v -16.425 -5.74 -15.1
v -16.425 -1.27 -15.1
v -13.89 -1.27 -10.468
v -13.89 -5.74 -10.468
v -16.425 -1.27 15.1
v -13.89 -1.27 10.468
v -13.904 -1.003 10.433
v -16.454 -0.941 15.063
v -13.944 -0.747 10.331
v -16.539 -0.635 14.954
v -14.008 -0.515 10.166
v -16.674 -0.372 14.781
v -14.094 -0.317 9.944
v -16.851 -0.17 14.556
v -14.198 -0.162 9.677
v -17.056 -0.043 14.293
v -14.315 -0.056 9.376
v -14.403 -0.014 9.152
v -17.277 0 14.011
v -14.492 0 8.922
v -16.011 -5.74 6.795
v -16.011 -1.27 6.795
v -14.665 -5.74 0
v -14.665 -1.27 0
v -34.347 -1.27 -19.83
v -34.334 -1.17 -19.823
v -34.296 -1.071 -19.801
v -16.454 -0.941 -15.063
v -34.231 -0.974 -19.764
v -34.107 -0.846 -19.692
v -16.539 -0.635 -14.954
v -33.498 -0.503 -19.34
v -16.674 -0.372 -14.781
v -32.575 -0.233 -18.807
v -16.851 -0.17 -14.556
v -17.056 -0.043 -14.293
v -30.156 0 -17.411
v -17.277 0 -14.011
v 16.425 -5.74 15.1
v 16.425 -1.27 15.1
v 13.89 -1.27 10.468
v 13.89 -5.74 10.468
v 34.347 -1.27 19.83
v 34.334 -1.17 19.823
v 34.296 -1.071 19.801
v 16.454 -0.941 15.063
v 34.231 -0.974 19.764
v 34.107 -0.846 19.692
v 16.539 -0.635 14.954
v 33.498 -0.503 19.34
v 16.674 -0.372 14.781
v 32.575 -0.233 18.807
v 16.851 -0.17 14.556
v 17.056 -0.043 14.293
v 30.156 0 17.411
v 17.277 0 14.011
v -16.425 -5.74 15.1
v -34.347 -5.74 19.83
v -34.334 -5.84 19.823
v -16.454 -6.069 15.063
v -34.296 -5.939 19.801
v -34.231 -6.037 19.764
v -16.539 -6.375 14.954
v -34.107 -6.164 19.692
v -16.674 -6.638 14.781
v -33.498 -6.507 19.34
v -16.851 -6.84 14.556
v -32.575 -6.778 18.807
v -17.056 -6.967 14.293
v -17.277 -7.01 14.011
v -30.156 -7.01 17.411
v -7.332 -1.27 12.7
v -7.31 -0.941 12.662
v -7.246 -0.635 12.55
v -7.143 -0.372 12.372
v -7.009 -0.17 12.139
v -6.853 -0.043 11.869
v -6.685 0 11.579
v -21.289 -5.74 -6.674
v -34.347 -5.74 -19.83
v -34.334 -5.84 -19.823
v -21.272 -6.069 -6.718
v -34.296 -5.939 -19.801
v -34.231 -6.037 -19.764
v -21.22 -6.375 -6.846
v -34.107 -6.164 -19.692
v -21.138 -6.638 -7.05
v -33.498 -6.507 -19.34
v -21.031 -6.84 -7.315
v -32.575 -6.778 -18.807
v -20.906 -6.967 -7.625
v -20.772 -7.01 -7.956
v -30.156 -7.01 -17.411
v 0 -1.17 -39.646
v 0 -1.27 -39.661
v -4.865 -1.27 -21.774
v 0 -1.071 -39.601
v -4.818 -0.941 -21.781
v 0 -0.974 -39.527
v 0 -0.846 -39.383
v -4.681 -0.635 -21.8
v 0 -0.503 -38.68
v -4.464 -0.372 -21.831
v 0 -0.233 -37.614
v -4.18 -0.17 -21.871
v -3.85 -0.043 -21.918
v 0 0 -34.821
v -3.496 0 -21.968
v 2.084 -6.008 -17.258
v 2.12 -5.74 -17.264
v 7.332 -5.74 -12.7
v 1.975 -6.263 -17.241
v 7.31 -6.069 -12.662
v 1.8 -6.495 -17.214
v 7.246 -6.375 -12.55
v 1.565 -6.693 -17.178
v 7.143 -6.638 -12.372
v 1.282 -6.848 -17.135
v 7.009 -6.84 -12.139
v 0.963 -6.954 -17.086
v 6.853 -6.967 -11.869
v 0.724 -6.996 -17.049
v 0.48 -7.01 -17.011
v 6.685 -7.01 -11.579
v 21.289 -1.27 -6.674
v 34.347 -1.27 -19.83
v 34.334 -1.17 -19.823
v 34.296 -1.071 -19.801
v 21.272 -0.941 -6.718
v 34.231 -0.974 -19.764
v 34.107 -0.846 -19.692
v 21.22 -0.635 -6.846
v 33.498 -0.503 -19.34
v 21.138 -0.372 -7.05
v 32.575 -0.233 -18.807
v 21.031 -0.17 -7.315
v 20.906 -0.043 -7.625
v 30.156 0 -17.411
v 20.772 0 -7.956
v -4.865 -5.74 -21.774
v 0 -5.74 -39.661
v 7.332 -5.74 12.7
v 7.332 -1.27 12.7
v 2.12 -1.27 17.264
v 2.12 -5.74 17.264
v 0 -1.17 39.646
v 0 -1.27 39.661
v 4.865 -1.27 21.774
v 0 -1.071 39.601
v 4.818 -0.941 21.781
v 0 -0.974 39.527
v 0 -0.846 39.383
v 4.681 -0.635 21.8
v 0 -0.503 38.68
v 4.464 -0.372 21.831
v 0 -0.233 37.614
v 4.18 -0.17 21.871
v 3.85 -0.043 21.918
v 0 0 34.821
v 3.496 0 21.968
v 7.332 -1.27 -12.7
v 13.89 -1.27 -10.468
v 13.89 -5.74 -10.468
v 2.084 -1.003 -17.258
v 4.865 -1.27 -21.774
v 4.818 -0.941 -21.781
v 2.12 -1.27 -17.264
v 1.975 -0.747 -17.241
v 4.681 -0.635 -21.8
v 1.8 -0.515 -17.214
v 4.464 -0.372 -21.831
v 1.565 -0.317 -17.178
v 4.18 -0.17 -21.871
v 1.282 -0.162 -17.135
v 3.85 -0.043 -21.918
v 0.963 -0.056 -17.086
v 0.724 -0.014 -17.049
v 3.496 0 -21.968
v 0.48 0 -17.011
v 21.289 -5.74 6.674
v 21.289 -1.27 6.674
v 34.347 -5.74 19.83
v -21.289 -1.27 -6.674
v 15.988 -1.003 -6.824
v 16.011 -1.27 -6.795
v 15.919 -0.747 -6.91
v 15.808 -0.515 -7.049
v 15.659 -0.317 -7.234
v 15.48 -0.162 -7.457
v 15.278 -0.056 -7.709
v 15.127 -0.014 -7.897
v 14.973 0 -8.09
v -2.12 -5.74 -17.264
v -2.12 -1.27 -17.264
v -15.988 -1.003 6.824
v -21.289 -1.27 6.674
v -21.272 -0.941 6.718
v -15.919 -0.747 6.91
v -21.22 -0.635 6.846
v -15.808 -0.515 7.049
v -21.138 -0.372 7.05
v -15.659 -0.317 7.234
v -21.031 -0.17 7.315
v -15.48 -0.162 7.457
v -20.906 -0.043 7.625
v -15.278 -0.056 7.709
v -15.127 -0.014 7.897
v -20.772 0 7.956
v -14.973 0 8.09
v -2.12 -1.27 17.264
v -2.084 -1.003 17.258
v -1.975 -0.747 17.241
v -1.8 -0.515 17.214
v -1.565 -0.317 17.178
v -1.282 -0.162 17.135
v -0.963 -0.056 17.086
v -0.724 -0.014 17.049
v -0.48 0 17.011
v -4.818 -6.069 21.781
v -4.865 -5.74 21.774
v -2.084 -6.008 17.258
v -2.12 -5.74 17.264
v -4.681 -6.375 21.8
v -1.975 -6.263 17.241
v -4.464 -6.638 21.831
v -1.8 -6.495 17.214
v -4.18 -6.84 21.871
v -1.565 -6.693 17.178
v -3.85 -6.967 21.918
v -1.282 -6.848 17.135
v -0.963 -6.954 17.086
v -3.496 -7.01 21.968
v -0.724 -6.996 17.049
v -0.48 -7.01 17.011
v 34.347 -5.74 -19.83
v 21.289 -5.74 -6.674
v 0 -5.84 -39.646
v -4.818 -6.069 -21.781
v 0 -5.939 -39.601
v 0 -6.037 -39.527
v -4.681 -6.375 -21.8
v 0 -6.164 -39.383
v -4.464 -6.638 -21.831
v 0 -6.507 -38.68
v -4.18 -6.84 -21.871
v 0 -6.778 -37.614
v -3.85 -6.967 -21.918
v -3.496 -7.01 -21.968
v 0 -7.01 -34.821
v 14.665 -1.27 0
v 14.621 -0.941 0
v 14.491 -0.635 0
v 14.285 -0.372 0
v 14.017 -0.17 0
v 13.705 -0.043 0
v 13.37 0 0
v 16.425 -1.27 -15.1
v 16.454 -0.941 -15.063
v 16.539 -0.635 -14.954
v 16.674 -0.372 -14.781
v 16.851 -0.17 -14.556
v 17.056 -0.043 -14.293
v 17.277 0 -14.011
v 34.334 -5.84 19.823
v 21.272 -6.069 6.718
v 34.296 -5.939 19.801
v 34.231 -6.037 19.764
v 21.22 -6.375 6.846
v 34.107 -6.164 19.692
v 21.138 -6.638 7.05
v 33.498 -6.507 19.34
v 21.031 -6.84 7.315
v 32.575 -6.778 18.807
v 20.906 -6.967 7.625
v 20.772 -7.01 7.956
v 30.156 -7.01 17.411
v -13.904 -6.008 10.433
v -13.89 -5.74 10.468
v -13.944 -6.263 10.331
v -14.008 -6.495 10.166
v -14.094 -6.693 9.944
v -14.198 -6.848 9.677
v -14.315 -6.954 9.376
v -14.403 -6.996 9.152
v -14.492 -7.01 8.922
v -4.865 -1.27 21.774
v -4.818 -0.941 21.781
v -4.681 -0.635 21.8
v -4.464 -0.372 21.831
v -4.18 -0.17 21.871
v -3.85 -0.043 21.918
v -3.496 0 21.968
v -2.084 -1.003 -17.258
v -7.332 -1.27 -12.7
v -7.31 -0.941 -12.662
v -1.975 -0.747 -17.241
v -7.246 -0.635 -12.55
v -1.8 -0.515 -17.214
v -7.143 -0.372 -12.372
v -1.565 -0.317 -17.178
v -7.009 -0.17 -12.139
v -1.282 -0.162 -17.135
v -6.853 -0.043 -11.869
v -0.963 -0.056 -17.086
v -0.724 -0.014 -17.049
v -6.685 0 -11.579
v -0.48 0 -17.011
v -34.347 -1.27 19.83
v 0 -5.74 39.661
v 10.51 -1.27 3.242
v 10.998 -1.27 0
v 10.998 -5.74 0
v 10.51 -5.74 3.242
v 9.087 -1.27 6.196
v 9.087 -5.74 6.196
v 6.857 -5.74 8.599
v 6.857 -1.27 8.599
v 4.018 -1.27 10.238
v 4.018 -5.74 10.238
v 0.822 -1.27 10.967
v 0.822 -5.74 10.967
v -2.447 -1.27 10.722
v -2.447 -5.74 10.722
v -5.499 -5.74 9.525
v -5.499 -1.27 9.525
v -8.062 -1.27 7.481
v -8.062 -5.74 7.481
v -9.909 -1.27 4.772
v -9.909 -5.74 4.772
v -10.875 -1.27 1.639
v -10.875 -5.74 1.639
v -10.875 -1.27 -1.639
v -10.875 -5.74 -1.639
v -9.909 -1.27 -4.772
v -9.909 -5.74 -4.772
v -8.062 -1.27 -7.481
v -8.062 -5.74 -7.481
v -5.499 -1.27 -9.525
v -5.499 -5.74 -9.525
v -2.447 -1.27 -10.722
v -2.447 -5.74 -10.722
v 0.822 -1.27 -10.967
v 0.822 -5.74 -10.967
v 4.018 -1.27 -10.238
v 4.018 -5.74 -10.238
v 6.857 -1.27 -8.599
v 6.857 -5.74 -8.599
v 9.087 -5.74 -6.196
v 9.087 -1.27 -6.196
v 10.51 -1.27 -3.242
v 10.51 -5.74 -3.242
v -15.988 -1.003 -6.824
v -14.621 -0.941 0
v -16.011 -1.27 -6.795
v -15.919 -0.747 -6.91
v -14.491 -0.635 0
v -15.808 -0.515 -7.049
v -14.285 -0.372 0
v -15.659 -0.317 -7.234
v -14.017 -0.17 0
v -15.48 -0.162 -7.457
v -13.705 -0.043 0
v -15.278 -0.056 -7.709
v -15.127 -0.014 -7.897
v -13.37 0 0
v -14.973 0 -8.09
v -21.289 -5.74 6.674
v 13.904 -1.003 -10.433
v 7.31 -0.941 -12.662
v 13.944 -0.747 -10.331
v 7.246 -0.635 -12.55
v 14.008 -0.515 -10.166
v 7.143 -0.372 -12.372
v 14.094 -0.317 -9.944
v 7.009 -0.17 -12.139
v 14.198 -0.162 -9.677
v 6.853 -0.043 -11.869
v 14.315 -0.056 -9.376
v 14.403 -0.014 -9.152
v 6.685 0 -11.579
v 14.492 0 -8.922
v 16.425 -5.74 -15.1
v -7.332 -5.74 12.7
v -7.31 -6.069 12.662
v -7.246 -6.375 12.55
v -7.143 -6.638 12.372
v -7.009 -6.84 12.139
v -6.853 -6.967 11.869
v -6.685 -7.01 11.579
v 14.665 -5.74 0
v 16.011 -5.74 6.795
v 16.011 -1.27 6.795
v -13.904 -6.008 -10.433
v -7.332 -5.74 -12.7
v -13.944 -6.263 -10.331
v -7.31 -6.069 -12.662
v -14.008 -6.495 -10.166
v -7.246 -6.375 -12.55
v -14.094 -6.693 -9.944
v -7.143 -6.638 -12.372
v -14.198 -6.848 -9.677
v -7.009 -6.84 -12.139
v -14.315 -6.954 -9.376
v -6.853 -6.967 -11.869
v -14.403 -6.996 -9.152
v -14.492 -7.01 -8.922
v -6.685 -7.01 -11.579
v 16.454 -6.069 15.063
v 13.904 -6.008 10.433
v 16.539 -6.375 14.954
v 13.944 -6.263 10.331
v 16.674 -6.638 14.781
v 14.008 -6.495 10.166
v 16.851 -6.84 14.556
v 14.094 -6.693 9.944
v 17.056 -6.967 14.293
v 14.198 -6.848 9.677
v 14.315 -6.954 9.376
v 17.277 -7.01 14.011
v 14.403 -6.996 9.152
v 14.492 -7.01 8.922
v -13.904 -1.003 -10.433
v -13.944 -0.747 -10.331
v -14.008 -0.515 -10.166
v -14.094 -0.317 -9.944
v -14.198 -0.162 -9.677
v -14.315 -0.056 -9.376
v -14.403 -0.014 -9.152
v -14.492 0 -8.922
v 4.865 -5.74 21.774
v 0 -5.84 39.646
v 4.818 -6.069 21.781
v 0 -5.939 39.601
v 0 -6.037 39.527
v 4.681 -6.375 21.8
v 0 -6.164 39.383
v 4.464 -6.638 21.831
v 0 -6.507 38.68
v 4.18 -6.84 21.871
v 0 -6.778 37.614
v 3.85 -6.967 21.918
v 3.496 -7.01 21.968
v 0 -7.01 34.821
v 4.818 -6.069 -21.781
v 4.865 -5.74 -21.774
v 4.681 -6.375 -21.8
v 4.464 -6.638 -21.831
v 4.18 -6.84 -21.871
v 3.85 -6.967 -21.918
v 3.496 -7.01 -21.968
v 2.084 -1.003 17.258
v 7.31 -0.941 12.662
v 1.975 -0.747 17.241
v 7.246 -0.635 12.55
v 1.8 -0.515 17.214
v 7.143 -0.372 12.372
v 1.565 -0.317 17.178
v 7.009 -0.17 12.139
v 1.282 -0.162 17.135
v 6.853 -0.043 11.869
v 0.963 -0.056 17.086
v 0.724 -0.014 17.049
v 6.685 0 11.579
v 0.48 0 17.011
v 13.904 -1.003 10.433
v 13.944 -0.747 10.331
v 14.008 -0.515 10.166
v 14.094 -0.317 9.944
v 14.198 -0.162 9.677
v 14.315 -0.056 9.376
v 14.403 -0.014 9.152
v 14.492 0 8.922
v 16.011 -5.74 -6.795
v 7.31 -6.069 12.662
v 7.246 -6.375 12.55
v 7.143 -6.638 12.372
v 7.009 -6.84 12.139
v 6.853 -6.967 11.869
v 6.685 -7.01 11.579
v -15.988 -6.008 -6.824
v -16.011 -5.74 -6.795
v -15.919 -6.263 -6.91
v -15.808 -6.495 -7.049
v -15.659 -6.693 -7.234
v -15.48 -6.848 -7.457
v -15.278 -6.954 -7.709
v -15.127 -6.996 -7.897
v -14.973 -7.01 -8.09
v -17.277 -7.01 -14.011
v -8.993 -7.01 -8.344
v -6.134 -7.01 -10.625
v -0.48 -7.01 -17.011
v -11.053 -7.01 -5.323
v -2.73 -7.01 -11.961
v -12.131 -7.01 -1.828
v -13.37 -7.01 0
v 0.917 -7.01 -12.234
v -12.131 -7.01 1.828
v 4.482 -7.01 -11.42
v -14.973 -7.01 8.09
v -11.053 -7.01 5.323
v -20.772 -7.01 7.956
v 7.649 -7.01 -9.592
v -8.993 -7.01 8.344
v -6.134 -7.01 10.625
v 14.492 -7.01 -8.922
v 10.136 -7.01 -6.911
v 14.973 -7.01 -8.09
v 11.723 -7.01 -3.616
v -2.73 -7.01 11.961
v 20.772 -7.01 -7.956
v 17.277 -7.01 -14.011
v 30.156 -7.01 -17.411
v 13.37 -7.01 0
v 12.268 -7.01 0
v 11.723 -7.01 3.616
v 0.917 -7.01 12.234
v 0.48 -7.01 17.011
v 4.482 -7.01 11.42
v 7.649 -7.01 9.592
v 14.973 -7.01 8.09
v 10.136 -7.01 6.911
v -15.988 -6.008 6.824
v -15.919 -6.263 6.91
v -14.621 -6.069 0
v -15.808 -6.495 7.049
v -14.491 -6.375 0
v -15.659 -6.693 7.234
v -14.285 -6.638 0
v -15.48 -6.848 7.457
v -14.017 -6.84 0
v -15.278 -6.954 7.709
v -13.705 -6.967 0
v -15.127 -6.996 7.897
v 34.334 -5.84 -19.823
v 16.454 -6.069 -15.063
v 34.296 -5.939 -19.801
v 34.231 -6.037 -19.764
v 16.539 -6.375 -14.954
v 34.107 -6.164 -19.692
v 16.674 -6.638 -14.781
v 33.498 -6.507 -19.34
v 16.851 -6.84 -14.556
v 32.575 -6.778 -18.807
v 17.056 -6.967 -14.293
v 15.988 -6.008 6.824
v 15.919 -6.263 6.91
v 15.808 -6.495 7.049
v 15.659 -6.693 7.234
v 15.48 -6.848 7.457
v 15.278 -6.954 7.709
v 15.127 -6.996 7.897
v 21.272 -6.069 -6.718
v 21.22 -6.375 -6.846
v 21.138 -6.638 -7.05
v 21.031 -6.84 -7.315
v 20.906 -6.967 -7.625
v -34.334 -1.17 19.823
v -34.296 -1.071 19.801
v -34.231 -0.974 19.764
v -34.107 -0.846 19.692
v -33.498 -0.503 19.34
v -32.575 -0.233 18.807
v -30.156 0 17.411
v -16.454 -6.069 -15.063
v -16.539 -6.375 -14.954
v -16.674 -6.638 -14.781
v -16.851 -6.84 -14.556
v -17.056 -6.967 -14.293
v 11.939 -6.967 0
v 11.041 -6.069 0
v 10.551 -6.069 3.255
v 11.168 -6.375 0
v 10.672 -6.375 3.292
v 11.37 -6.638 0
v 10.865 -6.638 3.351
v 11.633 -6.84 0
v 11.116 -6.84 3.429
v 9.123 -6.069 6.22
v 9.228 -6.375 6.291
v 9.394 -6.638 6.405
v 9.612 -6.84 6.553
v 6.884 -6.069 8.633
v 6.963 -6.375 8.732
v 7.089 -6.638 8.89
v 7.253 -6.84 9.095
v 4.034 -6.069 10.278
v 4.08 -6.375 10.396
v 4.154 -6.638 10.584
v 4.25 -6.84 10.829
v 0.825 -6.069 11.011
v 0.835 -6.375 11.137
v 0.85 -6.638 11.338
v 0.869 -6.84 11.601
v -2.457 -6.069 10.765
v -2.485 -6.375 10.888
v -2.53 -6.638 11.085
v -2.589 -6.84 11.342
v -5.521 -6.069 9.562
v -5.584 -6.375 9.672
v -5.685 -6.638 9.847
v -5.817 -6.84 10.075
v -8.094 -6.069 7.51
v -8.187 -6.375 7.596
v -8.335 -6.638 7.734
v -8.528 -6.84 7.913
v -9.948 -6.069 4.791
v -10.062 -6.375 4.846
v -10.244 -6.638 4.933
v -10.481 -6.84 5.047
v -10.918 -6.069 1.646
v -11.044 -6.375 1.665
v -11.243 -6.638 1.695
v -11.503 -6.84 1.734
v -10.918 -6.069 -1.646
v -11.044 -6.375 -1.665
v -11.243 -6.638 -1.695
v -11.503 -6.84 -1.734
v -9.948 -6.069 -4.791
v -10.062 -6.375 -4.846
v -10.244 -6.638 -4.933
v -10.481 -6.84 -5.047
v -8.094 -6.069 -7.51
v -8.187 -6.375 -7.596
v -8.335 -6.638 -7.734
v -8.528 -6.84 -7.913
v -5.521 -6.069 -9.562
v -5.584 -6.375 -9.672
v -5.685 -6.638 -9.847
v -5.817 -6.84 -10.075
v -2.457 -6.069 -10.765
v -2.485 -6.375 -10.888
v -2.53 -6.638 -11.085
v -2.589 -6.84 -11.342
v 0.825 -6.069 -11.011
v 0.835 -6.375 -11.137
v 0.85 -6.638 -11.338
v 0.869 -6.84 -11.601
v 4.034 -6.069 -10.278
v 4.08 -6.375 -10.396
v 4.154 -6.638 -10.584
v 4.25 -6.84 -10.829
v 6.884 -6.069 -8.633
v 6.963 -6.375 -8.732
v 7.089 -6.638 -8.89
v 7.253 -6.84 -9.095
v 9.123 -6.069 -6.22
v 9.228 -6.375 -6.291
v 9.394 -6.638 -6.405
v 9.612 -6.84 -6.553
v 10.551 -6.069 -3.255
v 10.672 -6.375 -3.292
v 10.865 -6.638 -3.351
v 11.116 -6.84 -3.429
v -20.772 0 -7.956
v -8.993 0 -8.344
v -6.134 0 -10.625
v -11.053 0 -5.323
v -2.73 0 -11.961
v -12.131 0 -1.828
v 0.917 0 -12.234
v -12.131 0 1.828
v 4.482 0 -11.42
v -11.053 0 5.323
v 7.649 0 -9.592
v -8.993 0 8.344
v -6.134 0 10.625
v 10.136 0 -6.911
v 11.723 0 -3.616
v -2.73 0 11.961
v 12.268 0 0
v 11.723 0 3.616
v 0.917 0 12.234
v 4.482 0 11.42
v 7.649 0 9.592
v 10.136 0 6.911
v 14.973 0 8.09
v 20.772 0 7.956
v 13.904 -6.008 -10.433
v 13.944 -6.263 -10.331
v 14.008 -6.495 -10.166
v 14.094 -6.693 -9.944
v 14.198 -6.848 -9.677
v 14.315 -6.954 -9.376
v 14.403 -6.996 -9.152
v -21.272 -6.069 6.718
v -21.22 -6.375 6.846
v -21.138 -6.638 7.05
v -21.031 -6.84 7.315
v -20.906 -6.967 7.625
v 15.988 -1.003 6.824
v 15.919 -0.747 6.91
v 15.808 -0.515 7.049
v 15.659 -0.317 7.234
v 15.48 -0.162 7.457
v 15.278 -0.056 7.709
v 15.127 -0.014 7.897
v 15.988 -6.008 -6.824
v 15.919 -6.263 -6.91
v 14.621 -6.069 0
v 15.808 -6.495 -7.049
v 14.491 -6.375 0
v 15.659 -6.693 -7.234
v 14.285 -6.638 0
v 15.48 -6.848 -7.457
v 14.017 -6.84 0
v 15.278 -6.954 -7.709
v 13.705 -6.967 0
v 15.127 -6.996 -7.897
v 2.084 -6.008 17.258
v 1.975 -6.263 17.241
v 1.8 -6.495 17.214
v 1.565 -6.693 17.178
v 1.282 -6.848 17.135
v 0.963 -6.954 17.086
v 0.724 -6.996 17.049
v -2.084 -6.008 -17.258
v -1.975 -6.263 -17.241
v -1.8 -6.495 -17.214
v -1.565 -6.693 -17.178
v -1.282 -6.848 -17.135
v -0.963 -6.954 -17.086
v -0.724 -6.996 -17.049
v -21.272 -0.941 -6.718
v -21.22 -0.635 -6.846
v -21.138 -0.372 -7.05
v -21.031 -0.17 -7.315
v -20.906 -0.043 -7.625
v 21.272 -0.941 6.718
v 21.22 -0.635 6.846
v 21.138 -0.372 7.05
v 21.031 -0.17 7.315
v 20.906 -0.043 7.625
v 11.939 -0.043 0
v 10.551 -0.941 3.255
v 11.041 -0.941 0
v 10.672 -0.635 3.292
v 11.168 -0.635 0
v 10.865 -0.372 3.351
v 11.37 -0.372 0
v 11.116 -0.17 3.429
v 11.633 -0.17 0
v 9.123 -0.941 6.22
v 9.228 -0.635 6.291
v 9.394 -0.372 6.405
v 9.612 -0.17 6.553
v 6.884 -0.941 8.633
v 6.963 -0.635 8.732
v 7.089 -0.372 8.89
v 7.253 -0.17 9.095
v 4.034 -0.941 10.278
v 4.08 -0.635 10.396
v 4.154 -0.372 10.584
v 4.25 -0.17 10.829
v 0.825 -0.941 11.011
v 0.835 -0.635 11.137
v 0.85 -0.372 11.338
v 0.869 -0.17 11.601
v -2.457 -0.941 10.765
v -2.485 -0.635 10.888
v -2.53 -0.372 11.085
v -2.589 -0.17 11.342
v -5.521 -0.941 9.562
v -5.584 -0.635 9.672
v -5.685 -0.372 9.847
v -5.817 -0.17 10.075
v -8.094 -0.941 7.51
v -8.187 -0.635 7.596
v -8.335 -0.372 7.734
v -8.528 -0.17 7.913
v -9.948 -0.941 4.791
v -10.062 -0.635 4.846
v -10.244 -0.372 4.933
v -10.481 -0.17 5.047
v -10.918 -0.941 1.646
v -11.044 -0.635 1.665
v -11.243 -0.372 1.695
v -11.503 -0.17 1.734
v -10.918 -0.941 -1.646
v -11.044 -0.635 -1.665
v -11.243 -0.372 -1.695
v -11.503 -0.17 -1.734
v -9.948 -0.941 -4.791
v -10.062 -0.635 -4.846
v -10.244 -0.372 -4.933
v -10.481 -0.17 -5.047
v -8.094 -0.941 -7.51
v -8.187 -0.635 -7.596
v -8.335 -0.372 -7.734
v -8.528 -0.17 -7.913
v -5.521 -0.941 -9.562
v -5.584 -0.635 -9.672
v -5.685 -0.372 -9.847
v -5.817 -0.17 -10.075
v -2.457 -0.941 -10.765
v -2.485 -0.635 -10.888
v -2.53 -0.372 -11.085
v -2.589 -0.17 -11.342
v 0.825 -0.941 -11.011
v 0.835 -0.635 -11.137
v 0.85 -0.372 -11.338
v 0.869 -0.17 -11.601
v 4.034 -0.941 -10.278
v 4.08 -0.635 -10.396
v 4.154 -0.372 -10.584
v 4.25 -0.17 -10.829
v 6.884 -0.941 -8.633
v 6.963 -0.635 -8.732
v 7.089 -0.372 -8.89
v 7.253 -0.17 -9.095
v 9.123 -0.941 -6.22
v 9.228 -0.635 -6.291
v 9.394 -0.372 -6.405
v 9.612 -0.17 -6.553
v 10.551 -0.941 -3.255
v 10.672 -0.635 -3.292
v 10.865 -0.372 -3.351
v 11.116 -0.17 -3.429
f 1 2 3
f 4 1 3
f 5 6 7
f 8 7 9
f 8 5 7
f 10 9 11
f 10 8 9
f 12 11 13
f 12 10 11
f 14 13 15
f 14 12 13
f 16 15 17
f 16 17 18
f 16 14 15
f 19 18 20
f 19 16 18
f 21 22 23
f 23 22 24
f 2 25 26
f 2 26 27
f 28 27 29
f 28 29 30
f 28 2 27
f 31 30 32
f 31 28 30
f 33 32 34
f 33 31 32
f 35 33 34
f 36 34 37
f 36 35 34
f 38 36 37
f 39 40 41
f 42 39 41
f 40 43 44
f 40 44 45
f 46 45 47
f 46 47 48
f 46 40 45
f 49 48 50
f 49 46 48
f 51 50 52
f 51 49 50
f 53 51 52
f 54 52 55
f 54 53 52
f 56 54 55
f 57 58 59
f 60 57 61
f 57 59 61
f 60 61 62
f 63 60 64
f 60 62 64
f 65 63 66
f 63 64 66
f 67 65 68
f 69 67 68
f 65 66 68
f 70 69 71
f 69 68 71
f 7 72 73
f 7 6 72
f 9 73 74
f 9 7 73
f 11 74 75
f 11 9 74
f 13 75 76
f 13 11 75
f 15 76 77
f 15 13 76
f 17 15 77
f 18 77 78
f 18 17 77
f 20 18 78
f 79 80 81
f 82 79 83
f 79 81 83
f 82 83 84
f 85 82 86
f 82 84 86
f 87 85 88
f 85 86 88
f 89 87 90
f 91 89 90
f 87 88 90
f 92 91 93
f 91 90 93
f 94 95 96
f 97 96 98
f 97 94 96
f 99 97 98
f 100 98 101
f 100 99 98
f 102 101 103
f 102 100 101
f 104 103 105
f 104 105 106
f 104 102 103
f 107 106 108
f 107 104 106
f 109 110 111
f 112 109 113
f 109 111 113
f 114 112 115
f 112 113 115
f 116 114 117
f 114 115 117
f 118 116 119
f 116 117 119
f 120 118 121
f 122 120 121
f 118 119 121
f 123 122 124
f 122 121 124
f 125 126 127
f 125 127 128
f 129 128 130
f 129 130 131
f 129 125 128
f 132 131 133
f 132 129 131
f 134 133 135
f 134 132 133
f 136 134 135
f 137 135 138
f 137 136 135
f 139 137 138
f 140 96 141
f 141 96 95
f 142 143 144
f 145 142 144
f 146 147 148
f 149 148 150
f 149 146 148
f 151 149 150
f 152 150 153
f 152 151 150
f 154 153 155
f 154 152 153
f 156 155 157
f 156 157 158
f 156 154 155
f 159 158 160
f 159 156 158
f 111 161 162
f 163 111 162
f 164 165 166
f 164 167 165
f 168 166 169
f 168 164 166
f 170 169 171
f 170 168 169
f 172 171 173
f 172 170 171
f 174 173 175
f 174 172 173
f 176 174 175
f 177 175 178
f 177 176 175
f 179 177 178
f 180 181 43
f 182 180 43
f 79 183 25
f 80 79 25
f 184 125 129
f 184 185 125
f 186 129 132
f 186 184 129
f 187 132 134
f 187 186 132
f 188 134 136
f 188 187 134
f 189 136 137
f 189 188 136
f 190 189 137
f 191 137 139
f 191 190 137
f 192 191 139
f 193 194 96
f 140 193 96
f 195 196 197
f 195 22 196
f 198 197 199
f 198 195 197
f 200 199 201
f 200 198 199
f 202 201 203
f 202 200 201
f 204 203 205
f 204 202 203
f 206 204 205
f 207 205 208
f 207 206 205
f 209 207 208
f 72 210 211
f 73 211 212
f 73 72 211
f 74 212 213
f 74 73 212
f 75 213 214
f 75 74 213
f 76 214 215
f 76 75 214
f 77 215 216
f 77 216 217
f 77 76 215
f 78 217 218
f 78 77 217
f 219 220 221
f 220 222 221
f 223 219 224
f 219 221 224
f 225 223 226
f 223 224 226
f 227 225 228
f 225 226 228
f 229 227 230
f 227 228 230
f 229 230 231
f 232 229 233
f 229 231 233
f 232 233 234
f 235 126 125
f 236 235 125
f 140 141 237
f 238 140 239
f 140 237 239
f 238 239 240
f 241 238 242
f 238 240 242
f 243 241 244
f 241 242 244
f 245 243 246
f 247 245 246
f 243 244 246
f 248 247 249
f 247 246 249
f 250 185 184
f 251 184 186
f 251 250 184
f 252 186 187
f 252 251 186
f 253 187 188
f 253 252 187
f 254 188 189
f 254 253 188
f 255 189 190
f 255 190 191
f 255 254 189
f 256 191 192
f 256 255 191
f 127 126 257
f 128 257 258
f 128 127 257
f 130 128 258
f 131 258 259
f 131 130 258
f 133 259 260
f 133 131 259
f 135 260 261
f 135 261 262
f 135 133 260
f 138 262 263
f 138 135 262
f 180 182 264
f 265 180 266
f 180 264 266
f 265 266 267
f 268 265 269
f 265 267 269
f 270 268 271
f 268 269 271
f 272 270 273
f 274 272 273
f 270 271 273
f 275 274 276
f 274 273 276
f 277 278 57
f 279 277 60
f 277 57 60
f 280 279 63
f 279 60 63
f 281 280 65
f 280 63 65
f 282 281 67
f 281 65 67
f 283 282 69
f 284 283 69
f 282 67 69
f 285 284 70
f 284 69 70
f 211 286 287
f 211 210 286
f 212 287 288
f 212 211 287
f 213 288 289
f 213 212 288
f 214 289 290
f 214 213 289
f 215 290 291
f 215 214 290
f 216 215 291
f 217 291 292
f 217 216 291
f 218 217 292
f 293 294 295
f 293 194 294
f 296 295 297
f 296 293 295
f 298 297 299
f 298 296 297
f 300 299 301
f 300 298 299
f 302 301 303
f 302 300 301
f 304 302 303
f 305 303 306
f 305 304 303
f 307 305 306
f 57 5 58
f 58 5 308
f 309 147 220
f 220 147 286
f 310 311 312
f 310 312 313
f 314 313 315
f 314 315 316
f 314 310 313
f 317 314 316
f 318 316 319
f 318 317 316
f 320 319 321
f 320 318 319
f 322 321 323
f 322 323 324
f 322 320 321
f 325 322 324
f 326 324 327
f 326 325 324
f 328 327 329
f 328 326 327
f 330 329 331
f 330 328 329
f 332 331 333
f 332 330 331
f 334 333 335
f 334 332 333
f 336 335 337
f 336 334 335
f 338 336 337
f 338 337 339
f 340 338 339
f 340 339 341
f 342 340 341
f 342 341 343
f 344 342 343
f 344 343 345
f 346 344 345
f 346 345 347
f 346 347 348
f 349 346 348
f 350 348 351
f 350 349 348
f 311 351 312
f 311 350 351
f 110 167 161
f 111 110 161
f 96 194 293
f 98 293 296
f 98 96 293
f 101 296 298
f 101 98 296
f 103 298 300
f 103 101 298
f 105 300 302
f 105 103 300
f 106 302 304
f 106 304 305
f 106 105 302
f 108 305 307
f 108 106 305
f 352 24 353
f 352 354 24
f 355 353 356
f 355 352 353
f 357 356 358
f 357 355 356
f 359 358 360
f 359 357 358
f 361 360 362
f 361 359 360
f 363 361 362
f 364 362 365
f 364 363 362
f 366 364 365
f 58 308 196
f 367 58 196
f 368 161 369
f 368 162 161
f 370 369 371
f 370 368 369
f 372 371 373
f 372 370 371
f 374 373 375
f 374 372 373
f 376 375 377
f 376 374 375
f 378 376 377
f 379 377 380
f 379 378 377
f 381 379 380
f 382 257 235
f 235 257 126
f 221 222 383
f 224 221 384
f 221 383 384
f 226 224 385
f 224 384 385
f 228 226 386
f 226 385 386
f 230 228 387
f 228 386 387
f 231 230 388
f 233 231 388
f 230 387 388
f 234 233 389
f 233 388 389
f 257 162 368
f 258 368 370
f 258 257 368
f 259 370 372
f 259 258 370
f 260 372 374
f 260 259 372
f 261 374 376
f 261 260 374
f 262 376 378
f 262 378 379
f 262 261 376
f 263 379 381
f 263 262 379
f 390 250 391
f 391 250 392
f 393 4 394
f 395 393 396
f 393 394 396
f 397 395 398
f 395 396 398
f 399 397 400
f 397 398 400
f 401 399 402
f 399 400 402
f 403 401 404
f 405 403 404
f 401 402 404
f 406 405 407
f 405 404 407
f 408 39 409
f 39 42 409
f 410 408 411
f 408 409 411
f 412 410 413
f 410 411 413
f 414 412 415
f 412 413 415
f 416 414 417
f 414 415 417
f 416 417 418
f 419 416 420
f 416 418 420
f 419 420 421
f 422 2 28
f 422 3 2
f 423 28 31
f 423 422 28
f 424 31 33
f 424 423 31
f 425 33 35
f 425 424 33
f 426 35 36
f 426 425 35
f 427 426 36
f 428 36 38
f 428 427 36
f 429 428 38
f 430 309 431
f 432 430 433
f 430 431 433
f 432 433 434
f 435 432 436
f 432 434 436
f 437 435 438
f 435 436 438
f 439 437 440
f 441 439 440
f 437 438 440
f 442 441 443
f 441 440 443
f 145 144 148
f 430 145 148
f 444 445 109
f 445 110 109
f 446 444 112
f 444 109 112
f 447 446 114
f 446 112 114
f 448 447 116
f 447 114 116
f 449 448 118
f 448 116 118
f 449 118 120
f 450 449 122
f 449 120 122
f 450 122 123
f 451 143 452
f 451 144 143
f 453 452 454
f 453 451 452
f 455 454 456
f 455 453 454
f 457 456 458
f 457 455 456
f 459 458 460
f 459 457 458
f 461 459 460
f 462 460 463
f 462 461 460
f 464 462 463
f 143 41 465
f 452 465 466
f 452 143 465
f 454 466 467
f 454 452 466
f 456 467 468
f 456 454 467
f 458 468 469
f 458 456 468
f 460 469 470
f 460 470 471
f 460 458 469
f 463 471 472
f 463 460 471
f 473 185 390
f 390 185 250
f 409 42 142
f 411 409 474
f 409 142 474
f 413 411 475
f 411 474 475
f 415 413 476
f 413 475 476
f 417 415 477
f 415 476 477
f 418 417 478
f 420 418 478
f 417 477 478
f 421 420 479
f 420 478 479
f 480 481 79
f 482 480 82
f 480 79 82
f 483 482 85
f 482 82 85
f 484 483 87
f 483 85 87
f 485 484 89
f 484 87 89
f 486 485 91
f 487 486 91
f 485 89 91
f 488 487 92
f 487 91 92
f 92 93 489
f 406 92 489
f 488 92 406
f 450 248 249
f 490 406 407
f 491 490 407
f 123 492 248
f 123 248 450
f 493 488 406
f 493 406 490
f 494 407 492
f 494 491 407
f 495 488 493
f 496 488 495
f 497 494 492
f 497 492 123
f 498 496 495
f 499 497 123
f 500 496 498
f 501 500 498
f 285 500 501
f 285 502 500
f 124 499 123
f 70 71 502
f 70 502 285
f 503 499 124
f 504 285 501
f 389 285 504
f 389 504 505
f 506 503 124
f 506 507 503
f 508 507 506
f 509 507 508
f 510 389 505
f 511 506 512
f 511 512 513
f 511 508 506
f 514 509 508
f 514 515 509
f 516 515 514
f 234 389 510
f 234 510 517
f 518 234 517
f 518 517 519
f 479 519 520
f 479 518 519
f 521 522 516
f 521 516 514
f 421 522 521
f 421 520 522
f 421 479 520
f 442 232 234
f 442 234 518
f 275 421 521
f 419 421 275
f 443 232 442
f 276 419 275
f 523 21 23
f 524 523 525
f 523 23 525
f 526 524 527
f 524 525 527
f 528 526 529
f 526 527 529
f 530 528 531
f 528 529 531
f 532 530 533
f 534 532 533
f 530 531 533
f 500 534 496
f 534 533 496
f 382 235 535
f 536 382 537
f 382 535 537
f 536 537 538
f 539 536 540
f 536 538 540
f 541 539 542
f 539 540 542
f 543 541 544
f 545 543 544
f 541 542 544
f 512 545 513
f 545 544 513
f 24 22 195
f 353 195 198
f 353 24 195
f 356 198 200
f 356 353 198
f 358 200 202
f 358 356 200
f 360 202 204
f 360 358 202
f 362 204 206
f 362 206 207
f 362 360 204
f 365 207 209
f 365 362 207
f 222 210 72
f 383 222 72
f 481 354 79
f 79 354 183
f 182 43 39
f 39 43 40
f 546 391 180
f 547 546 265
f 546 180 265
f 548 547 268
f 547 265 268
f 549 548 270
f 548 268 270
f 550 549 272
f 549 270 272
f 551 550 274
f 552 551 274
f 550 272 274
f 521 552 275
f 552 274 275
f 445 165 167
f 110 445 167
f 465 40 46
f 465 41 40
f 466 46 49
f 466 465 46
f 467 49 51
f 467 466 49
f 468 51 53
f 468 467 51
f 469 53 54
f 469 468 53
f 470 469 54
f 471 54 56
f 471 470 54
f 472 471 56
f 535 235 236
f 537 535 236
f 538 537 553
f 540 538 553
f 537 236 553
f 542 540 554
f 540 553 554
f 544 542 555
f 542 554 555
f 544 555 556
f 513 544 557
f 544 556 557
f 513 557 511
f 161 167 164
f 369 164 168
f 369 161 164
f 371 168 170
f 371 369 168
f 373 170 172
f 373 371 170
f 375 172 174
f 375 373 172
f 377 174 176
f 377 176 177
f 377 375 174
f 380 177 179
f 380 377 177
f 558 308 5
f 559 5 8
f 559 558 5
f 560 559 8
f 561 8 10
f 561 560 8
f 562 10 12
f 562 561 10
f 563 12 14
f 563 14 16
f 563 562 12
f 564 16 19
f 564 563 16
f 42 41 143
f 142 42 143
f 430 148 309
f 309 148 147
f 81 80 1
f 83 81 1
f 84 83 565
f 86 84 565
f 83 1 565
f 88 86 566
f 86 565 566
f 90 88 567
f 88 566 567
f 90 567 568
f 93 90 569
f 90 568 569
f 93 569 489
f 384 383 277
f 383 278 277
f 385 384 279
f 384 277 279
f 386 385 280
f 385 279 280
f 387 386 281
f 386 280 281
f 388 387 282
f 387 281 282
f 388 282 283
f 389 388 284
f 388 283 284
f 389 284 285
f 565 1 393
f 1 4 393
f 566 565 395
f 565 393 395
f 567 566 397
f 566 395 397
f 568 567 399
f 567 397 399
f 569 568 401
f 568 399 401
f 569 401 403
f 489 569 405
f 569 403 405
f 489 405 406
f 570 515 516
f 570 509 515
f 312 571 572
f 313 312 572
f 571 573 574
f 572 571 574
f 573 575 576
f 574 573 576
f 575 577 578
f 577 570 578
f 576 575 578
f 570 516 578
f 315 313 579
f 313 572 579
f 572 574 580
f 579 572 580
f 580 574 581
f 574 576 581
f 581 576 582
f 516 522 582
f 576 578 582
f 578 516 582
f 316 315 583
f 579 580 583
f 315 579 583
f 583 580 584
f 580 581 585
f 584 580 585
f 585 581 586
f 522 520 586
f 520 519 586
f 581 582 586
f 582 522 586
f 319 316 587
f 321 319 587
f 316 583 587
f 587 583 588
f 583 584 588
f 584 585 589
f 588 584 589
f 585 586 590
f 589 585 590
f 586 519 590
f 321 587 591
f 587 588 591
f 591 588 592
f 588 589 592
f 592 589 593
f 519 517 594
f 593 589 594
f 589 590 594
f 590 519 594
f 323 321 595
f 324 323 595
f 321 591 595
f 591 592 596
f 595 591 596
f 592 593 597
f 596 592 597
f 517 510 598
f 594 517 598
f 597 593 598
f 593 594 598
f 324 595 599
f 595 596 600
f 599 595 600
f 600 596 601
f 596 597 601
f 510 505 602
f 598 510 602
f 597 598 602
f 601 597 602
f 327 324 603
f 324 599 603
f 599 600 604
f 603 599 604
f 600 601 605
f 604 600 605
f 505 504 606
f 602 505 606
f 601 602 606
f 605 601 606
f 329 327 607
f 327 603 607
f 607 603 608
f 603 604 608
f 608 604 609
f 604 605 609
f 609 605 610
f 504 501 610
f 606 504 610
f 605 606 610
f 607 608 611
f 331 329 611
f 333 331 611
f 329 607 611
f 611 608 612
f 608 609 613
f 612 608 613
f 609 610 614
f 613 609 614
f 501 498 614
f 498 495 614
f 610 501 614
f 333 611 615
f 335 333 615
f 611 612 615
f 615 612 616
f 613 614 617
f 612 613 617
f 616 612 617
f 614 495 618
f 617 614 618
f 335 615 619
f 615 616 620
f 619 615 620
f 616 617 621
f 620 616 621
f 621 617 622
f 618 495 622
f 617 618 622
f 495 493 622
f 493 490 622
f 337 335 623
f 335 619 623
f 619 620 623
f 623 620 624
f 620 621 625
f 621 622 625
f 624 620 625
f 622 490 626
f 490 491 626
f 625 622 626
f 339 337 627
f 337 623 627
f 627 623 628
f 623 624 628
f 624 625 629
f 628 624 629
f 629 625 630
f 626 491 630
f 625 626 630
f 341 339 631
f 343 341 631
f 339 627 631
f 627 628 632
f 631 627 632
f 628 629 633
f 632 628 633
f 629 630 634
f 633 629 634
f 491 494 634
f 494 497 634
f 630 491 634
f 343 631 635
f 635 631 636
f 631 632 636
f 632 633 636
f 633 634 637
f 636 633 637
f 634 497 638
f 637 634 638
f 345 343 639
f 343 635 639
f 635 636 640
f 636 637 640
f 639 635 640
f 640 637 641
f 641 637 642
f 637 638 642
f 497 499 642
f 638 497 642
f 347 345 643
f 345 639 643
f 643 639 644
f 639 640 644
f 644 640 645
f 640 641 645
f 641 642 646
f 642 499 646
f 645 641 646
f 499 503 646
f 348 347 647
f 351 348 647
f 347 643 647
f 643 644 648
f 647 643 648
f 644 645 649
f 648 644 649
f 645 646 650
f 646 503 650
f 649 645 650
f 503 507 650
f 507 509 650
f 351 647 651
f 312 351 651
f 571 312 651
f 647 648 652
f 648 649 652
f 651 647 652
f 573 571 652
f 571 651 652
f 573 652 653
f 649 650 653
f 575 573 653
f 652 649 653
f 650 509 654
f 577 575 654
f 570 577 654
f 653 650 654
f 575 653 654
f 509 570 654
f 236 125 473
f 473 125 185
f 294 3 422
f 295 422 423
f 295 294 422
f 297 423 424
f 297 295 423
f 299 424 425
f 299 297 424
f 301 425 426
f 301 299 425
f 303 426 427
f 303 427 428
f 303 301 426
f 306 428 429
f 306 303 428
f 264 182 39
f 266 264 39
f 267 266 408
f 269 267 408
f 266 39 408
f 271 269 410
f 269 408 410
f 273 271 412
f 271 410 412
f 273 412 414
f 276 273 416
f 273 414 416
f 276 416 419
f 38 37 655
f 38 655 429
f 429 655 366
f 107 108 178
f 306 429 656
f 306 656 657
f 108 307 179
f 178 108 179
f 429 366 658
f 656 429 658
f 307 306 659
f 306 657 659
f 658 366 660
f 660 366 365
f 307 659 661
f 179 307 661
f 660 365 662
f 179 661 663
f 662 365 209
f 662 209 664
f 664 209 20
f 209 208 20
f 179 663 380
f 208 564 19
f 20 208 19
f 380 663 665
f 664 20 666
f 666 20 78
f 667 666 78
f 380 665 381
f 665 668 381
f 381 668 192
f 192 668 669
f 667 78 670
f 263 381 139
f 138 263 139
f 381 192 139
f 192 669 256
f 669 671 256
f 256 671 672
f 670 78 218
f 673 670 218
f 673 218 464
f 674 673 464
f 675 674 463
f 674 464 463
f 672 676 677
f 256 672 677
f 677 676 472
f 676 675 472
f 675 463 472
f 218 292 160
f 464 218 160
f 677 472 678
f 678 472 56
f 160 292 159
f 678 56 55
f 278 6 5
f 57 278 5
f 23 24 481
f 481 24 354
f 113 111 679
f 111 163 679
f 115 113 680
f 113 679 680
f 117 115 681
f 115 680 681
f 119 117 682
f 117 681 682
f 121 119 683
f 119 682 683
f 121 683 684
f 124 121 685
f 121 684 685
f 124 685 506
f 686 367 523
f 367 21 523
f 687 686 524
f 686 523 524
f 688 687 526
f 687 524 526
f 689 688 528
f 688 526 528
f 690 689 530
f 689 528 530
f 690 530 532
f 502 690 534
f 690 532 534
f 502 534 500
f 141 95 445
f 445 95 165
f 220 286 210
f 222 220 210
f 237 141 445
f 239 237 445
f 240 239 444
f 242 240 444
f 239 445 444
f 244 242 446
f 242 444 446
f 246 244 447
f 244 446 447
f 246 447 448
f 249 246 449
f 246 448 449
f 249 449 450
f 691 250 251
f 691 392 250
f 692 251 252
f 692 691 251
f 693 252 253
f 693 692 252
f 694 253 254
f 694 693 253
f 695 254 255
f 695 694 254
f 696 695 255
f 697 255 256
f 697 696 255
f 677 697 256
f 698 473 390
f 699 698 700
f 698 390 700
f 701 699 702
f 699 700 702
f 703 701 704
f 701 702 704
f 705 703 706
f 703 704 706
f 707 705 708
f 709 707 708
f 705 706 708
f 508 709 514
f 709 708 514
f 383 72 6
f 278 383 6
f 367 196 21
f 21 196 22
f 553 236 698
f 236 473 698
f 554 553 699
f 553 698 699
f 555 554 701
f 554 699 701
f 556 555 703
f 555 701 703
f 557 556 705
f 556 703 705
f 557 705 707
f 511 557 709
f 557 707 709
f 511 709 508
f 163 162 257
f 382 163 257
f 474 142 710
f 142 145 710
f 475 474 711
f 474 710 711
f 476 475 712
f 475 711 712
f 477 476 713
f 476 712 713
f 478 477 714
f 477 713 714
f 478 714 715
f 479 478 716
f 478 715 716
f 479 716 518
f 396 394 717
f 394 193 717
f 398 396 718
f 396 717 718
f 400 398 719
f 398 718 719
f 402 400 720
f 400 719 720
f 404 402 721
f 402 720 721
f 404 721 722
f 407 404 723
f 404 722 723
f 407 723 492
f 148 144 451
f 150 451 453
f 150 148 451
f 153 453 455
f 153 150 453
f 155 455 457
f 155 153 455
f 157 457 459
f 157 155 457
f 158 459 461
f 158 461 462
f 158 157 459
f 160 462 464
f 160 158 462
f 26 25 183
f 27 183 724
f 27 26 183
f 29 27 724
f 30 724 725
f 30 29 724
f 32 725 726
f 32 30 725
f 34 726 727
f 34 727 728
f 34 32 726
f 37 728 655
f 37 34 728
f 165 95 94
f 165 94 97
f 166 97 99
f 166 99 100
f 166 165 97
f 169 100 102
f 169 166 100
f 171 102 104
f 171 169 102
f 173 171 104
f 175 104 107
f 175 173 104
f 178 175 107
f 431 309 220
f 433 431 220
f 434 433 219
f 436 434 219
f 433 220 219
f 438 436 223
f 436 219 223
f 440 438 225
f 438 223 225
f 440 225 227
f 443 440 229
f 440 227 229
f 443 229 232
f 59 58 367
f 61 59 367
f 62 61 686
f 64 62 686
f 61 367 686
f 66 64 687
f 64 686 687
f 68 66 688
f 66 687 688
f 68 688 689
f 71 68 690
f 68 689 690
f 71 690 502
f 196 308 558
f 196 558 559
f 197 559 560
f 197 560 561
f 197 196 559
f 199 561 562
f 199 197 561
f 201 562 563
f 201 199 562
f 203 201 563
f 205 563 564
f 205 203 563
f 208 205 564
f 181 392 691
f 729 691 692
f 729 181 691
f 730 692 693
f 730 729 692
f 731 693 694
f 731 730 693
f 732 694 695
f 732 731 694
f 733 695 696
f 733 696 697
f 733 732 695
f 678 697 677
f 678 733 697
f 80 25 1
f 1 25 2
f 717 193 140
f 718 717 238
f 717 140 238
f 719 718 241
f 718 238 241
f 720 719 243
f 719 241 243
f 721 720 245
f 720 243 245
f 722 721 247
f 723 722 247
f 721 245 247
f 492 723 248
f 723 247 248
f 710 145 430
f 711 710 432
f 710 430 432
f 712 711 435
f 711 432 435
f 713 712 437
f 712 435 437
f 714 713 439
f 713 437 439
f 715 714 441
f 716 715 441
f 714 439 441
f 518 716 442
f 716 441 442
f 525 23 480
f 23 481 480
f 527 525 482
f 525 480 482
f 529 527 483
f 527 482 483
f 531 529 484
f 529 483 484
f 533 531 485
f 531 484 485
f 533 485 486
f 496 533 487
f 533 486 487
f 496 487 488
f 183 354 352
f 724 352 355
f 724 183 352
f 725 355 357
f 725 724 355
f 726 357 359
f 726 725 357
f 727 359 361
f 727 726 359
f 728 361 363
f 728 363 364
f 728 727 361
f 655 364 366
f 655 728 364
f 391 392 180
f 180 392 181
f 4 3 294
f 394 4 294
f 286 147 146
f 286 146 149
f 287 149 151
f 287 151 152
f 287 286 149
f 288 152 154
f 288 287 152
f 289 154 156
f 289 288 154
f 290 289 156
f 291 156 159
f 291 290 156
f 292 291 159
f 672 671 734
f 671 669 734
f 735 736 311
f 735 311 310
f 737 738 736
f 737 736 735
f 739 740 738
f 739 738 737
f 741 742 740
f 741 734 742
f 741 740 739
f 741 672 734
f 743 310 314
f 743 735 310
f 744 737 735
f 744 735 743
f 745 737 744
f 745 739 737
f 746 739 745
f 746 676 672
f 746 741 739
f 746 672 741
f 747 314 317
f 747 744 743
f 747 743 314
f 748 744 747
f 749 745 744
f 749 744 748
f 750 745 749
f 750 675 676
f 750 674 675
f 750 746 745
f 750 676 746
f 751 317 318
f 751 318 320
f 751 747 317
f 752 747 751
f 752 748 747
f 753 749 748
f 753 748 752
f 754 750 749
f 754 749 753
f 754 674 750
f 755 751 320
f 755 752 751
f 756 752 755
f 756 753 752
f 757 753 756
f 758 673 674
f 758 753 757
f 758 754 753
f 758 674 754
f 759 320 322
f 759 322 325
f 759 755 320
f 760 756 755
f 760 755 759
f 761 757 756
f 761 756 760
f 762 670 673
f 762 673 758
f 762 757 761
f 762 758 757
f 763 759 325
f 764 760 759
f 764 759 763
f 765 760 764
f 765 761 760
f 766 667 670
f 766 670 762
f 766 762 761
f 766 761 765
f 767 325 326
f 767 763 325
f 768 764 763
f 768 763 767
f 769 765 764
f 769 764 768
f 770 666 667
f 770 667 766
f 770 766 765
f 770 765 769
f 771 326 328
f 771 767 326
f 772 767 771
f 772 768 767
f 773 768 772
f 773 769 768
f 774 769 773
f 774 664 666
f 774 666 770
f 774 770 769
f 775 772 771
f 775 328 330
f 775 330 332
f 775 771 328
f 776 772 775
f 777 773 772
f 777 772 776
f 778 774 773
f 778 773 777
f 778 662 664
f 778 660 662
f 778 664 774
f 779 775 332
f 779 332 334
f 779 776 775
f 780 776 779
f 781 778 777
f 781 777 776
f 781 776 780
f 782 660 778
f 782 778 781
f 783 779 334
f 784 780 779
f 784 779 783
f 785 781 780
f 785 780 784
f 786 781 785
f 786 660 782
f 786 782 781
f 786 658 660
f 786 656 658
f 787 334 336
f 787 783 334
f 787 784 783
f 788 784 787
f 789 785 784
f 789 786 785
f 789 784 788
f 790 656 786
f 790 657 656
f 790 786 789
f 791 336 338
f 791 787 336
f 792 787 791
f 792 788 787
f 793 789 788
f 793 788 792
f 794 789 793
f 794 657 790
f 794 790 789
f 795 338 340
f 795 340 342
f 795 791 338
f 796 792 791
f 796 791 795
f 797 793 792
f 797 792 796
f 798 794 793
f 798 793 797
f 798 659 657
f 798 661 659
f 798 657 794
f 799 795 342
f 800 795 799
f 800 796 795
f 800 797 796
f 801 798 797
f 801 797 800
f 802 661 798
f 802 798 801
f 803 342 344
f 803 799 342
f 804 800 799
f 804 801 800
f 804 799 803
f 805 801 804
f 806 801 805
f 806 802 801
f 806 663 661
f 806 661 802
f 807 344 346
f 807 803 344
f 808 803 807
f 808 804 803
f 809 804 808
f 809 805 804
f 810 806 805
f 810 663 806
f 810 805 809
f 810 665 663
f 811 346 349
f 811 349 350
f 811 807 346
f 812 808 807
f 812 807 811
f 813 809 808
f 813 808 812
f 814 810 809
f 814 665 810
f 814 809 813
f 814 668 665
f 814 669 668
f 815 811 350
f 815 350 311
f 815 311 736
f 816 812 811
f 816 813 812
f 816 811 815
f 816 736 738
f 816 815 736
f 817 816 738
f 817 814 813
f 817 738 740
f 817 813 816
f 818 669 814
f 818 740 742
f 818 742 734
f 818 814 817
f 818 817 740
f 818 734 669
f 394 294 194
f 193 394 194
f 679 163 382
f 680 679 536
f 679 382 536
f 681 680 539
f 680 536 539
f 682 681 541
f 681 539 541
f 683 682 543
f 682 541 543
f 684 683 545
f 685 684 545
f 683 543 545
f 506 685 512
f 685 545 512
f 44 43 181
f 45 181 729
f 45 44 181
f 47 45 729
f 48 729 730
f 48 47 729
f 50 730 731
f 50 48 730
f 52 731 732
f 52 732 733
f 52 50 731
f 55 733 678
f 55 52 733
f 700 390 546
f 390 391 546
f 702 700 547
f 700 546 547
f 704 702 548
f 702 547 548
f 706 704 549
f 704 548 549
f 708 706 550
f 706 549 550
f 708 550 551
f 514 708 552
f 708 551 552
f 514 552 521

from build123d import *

# Parameters (mm, degrees)
F0_R     = 10.9982
F1_DEPTH = 7.0104
F2_R     = 1.27


with BuildPart() as f1:
    # F0 (on Front) → F1 (new body)
    with BuildSketch(Plane.XZ):
        Polygon((-7.332348, -12.7), (7.332348, -12.7), (14.664697, 0), (7.332348, 12.7), (-7.332348, 12.7), (-14.664697, 0), align=None)
        Circle(F0_R, mode=Mode.SUBTRACT)
        Polygon((-7.332348, 12.7), (7.332348, 12.7), (2.120396, 17.263552), (4.864522, 21.774086), (0, 39.660717), (-4.864522, 21.774086), (-2.120396, 17.263552), align=None)
        Polygon((-16.010873, 6.795459), (-14.664697, 0), (-7.332348, 12.7), (-13.890477, 10.468093), (-16.424651, 15.099843), (-34.347189, 19.830359), (-21.289173, 6.674243), align=None)
        Polygon((-13.890477, -10.468093), (-7.332348, -12.7), (-14.664697, 0), (-16.010873, -6.795459), (-21.289173, -6.674243), (-34.347189, -19.830359), (-16.424651, -15.099843), align=None)
        Polygon((2.120396, -17.263552), (7.332348, -12.7), (-7.332348, -12.7), (-2.120396, -17.263552), (-4.864522, -21.774086), (0, -39.660717), (4.864522, -21.774086), align=None)
        Polygon((14.664697, 0), (7.332348, -12.7), (13.890477, -10.468093), (16.424651, -15.099843), (34.347189, -19.830359), (21.289173, -6.674243), (16.010873, -6.795459), align=None)
        Polygon((7.332348, 12.7), (14.664697, 0), (16.010873, 6.795459), (21.289173, 6.674243), (34.347189, 19.830359), (16.424651, 15.099843), (13.890477, 10.468093), align=None)
    extrude(amount=F1_DEPTH)

    # F2
    f2_edges = [f1.edges().sort_by_distance(p)[0] for p in [
        (4.726372, -7.0104, 14.981776),
        (3.492459, -7.0104, 19.518819),
        (2.432261, -7.0104, 30.717402),
        (-2.432261, -7.0104, 30.717402),
        (-3.492459, -7.0104, 19.518819),
        (-4.726372, -7.0104, 14.981776),
        (-10.611413, -7.0104, 11.584046),
        (-15.157564, -7.0104, 12.783968),
        (-25.38592, -7.0104, 17.465101),
        (-27.818181, -7.0104, 13.252301),
        (-18.650023, -7.0104, 6.734851),
        (-15.337785, -7.0104, 3.39773),
        (-15.337785, -7.0104, -3.39773),
        (-18.650023, -7.0104, -6.734851),
        (-27.818181, -7.0104, -13.252301),
        (-25.38592, -7.0104, -17.465101),
        (-15.157564, -7.0104, -12.783968),
        (-10.611413, -7.0104, -11.584046),
        (-4.726372, -7.0104, -14.981776),
        (-3.492459, -7.0104, -19.518819),
        (-2.432261, -7.0104, -30.717402),
        (2.432261, -7.0104, -30.717402),
        (3.492459, -7.0104, -19.518819),
        (4.726372, -7.0104, -14.981776),
        (10.611413, -7.0104, -11.584046),
        (15.157564, -7.0104, -12.783968),
        (25.38592, -7.0104, -17.465101),
        (27.818181, -7.0104, -13.252301),
        (18.650023, -7.0104, -6.734851),
        (15.337785, -7.0104, -3.39773),
        (15.337785, -7.0104, 3.39773),
        (18.650023, -7.0104, 6.734851),
        (27.818181, -7.0104, 13.252301),
        (25.38592, -7.0104, 17.465101),
        (15.157564, -7.0104, 12.783968),
        (10.611413, -7.0104, 11.584046),
        (-10.9982, -7.0104, 0),
        (4.726372, 0, 14.981776),
        (3.492459, 0, 19.518819),
        (2.432261, 0, 30.717402),
        (-2.432261, 0, 30.717402),
        (-3.492459, 0, 19.518819),
        (-4.726372, 0, 14.981776),
        (-10.611413, 0, 11.584046),
        (-15.157564, 0, 12.783968),
        (-25.38592, 0, 17.465101),
        (-27.818181, 0, 13.252301),
        (-18.650023, 0, 6.734851),
        (-15.337785, 0, 3.39773),
        (-15.337785, 0, -3.39773),
        (-18.650023, 0, -6.734851),
        (-27.818181, 0, -13.252301),
        (-25.38592, 0, -17.465101),
        (-15.157564, 0, -12.783968),
        (-10.611413, 0, -11.584046),
        (-4.726372, 0, -14.981776),
        (-3.492459, 0, -19.518819),
        (-2.432261, 0, -30.717402),
        (2.432261, 0, -30.717402),
        (3.492459, 0, -19.518819),
        (4.726372, 0, -14.981776),
        (10.611413, 0, -11.584046),
        (15.157564, 0, -12.783968),
        (25.38592, 0, -17.465101),
        (27.818181, 0, -13.252301),
        (18.650023, 0, -6.734851),
        (15.337785, 0, -3.39773),
        (15.337785, 0, 3.39773),
        (18.650023, 0, 6.734851),
        (27.818181, 0, 13.252301),
        (25.38592, 0, 17.465101),
        (15.157564, 0, 12.783968),
        (10.611413, 0, 11.584046),
        (-10.9982, 0, 0),
    ]]
    fillet(f2_edges, radius=F2_R)


solid = f1.part
